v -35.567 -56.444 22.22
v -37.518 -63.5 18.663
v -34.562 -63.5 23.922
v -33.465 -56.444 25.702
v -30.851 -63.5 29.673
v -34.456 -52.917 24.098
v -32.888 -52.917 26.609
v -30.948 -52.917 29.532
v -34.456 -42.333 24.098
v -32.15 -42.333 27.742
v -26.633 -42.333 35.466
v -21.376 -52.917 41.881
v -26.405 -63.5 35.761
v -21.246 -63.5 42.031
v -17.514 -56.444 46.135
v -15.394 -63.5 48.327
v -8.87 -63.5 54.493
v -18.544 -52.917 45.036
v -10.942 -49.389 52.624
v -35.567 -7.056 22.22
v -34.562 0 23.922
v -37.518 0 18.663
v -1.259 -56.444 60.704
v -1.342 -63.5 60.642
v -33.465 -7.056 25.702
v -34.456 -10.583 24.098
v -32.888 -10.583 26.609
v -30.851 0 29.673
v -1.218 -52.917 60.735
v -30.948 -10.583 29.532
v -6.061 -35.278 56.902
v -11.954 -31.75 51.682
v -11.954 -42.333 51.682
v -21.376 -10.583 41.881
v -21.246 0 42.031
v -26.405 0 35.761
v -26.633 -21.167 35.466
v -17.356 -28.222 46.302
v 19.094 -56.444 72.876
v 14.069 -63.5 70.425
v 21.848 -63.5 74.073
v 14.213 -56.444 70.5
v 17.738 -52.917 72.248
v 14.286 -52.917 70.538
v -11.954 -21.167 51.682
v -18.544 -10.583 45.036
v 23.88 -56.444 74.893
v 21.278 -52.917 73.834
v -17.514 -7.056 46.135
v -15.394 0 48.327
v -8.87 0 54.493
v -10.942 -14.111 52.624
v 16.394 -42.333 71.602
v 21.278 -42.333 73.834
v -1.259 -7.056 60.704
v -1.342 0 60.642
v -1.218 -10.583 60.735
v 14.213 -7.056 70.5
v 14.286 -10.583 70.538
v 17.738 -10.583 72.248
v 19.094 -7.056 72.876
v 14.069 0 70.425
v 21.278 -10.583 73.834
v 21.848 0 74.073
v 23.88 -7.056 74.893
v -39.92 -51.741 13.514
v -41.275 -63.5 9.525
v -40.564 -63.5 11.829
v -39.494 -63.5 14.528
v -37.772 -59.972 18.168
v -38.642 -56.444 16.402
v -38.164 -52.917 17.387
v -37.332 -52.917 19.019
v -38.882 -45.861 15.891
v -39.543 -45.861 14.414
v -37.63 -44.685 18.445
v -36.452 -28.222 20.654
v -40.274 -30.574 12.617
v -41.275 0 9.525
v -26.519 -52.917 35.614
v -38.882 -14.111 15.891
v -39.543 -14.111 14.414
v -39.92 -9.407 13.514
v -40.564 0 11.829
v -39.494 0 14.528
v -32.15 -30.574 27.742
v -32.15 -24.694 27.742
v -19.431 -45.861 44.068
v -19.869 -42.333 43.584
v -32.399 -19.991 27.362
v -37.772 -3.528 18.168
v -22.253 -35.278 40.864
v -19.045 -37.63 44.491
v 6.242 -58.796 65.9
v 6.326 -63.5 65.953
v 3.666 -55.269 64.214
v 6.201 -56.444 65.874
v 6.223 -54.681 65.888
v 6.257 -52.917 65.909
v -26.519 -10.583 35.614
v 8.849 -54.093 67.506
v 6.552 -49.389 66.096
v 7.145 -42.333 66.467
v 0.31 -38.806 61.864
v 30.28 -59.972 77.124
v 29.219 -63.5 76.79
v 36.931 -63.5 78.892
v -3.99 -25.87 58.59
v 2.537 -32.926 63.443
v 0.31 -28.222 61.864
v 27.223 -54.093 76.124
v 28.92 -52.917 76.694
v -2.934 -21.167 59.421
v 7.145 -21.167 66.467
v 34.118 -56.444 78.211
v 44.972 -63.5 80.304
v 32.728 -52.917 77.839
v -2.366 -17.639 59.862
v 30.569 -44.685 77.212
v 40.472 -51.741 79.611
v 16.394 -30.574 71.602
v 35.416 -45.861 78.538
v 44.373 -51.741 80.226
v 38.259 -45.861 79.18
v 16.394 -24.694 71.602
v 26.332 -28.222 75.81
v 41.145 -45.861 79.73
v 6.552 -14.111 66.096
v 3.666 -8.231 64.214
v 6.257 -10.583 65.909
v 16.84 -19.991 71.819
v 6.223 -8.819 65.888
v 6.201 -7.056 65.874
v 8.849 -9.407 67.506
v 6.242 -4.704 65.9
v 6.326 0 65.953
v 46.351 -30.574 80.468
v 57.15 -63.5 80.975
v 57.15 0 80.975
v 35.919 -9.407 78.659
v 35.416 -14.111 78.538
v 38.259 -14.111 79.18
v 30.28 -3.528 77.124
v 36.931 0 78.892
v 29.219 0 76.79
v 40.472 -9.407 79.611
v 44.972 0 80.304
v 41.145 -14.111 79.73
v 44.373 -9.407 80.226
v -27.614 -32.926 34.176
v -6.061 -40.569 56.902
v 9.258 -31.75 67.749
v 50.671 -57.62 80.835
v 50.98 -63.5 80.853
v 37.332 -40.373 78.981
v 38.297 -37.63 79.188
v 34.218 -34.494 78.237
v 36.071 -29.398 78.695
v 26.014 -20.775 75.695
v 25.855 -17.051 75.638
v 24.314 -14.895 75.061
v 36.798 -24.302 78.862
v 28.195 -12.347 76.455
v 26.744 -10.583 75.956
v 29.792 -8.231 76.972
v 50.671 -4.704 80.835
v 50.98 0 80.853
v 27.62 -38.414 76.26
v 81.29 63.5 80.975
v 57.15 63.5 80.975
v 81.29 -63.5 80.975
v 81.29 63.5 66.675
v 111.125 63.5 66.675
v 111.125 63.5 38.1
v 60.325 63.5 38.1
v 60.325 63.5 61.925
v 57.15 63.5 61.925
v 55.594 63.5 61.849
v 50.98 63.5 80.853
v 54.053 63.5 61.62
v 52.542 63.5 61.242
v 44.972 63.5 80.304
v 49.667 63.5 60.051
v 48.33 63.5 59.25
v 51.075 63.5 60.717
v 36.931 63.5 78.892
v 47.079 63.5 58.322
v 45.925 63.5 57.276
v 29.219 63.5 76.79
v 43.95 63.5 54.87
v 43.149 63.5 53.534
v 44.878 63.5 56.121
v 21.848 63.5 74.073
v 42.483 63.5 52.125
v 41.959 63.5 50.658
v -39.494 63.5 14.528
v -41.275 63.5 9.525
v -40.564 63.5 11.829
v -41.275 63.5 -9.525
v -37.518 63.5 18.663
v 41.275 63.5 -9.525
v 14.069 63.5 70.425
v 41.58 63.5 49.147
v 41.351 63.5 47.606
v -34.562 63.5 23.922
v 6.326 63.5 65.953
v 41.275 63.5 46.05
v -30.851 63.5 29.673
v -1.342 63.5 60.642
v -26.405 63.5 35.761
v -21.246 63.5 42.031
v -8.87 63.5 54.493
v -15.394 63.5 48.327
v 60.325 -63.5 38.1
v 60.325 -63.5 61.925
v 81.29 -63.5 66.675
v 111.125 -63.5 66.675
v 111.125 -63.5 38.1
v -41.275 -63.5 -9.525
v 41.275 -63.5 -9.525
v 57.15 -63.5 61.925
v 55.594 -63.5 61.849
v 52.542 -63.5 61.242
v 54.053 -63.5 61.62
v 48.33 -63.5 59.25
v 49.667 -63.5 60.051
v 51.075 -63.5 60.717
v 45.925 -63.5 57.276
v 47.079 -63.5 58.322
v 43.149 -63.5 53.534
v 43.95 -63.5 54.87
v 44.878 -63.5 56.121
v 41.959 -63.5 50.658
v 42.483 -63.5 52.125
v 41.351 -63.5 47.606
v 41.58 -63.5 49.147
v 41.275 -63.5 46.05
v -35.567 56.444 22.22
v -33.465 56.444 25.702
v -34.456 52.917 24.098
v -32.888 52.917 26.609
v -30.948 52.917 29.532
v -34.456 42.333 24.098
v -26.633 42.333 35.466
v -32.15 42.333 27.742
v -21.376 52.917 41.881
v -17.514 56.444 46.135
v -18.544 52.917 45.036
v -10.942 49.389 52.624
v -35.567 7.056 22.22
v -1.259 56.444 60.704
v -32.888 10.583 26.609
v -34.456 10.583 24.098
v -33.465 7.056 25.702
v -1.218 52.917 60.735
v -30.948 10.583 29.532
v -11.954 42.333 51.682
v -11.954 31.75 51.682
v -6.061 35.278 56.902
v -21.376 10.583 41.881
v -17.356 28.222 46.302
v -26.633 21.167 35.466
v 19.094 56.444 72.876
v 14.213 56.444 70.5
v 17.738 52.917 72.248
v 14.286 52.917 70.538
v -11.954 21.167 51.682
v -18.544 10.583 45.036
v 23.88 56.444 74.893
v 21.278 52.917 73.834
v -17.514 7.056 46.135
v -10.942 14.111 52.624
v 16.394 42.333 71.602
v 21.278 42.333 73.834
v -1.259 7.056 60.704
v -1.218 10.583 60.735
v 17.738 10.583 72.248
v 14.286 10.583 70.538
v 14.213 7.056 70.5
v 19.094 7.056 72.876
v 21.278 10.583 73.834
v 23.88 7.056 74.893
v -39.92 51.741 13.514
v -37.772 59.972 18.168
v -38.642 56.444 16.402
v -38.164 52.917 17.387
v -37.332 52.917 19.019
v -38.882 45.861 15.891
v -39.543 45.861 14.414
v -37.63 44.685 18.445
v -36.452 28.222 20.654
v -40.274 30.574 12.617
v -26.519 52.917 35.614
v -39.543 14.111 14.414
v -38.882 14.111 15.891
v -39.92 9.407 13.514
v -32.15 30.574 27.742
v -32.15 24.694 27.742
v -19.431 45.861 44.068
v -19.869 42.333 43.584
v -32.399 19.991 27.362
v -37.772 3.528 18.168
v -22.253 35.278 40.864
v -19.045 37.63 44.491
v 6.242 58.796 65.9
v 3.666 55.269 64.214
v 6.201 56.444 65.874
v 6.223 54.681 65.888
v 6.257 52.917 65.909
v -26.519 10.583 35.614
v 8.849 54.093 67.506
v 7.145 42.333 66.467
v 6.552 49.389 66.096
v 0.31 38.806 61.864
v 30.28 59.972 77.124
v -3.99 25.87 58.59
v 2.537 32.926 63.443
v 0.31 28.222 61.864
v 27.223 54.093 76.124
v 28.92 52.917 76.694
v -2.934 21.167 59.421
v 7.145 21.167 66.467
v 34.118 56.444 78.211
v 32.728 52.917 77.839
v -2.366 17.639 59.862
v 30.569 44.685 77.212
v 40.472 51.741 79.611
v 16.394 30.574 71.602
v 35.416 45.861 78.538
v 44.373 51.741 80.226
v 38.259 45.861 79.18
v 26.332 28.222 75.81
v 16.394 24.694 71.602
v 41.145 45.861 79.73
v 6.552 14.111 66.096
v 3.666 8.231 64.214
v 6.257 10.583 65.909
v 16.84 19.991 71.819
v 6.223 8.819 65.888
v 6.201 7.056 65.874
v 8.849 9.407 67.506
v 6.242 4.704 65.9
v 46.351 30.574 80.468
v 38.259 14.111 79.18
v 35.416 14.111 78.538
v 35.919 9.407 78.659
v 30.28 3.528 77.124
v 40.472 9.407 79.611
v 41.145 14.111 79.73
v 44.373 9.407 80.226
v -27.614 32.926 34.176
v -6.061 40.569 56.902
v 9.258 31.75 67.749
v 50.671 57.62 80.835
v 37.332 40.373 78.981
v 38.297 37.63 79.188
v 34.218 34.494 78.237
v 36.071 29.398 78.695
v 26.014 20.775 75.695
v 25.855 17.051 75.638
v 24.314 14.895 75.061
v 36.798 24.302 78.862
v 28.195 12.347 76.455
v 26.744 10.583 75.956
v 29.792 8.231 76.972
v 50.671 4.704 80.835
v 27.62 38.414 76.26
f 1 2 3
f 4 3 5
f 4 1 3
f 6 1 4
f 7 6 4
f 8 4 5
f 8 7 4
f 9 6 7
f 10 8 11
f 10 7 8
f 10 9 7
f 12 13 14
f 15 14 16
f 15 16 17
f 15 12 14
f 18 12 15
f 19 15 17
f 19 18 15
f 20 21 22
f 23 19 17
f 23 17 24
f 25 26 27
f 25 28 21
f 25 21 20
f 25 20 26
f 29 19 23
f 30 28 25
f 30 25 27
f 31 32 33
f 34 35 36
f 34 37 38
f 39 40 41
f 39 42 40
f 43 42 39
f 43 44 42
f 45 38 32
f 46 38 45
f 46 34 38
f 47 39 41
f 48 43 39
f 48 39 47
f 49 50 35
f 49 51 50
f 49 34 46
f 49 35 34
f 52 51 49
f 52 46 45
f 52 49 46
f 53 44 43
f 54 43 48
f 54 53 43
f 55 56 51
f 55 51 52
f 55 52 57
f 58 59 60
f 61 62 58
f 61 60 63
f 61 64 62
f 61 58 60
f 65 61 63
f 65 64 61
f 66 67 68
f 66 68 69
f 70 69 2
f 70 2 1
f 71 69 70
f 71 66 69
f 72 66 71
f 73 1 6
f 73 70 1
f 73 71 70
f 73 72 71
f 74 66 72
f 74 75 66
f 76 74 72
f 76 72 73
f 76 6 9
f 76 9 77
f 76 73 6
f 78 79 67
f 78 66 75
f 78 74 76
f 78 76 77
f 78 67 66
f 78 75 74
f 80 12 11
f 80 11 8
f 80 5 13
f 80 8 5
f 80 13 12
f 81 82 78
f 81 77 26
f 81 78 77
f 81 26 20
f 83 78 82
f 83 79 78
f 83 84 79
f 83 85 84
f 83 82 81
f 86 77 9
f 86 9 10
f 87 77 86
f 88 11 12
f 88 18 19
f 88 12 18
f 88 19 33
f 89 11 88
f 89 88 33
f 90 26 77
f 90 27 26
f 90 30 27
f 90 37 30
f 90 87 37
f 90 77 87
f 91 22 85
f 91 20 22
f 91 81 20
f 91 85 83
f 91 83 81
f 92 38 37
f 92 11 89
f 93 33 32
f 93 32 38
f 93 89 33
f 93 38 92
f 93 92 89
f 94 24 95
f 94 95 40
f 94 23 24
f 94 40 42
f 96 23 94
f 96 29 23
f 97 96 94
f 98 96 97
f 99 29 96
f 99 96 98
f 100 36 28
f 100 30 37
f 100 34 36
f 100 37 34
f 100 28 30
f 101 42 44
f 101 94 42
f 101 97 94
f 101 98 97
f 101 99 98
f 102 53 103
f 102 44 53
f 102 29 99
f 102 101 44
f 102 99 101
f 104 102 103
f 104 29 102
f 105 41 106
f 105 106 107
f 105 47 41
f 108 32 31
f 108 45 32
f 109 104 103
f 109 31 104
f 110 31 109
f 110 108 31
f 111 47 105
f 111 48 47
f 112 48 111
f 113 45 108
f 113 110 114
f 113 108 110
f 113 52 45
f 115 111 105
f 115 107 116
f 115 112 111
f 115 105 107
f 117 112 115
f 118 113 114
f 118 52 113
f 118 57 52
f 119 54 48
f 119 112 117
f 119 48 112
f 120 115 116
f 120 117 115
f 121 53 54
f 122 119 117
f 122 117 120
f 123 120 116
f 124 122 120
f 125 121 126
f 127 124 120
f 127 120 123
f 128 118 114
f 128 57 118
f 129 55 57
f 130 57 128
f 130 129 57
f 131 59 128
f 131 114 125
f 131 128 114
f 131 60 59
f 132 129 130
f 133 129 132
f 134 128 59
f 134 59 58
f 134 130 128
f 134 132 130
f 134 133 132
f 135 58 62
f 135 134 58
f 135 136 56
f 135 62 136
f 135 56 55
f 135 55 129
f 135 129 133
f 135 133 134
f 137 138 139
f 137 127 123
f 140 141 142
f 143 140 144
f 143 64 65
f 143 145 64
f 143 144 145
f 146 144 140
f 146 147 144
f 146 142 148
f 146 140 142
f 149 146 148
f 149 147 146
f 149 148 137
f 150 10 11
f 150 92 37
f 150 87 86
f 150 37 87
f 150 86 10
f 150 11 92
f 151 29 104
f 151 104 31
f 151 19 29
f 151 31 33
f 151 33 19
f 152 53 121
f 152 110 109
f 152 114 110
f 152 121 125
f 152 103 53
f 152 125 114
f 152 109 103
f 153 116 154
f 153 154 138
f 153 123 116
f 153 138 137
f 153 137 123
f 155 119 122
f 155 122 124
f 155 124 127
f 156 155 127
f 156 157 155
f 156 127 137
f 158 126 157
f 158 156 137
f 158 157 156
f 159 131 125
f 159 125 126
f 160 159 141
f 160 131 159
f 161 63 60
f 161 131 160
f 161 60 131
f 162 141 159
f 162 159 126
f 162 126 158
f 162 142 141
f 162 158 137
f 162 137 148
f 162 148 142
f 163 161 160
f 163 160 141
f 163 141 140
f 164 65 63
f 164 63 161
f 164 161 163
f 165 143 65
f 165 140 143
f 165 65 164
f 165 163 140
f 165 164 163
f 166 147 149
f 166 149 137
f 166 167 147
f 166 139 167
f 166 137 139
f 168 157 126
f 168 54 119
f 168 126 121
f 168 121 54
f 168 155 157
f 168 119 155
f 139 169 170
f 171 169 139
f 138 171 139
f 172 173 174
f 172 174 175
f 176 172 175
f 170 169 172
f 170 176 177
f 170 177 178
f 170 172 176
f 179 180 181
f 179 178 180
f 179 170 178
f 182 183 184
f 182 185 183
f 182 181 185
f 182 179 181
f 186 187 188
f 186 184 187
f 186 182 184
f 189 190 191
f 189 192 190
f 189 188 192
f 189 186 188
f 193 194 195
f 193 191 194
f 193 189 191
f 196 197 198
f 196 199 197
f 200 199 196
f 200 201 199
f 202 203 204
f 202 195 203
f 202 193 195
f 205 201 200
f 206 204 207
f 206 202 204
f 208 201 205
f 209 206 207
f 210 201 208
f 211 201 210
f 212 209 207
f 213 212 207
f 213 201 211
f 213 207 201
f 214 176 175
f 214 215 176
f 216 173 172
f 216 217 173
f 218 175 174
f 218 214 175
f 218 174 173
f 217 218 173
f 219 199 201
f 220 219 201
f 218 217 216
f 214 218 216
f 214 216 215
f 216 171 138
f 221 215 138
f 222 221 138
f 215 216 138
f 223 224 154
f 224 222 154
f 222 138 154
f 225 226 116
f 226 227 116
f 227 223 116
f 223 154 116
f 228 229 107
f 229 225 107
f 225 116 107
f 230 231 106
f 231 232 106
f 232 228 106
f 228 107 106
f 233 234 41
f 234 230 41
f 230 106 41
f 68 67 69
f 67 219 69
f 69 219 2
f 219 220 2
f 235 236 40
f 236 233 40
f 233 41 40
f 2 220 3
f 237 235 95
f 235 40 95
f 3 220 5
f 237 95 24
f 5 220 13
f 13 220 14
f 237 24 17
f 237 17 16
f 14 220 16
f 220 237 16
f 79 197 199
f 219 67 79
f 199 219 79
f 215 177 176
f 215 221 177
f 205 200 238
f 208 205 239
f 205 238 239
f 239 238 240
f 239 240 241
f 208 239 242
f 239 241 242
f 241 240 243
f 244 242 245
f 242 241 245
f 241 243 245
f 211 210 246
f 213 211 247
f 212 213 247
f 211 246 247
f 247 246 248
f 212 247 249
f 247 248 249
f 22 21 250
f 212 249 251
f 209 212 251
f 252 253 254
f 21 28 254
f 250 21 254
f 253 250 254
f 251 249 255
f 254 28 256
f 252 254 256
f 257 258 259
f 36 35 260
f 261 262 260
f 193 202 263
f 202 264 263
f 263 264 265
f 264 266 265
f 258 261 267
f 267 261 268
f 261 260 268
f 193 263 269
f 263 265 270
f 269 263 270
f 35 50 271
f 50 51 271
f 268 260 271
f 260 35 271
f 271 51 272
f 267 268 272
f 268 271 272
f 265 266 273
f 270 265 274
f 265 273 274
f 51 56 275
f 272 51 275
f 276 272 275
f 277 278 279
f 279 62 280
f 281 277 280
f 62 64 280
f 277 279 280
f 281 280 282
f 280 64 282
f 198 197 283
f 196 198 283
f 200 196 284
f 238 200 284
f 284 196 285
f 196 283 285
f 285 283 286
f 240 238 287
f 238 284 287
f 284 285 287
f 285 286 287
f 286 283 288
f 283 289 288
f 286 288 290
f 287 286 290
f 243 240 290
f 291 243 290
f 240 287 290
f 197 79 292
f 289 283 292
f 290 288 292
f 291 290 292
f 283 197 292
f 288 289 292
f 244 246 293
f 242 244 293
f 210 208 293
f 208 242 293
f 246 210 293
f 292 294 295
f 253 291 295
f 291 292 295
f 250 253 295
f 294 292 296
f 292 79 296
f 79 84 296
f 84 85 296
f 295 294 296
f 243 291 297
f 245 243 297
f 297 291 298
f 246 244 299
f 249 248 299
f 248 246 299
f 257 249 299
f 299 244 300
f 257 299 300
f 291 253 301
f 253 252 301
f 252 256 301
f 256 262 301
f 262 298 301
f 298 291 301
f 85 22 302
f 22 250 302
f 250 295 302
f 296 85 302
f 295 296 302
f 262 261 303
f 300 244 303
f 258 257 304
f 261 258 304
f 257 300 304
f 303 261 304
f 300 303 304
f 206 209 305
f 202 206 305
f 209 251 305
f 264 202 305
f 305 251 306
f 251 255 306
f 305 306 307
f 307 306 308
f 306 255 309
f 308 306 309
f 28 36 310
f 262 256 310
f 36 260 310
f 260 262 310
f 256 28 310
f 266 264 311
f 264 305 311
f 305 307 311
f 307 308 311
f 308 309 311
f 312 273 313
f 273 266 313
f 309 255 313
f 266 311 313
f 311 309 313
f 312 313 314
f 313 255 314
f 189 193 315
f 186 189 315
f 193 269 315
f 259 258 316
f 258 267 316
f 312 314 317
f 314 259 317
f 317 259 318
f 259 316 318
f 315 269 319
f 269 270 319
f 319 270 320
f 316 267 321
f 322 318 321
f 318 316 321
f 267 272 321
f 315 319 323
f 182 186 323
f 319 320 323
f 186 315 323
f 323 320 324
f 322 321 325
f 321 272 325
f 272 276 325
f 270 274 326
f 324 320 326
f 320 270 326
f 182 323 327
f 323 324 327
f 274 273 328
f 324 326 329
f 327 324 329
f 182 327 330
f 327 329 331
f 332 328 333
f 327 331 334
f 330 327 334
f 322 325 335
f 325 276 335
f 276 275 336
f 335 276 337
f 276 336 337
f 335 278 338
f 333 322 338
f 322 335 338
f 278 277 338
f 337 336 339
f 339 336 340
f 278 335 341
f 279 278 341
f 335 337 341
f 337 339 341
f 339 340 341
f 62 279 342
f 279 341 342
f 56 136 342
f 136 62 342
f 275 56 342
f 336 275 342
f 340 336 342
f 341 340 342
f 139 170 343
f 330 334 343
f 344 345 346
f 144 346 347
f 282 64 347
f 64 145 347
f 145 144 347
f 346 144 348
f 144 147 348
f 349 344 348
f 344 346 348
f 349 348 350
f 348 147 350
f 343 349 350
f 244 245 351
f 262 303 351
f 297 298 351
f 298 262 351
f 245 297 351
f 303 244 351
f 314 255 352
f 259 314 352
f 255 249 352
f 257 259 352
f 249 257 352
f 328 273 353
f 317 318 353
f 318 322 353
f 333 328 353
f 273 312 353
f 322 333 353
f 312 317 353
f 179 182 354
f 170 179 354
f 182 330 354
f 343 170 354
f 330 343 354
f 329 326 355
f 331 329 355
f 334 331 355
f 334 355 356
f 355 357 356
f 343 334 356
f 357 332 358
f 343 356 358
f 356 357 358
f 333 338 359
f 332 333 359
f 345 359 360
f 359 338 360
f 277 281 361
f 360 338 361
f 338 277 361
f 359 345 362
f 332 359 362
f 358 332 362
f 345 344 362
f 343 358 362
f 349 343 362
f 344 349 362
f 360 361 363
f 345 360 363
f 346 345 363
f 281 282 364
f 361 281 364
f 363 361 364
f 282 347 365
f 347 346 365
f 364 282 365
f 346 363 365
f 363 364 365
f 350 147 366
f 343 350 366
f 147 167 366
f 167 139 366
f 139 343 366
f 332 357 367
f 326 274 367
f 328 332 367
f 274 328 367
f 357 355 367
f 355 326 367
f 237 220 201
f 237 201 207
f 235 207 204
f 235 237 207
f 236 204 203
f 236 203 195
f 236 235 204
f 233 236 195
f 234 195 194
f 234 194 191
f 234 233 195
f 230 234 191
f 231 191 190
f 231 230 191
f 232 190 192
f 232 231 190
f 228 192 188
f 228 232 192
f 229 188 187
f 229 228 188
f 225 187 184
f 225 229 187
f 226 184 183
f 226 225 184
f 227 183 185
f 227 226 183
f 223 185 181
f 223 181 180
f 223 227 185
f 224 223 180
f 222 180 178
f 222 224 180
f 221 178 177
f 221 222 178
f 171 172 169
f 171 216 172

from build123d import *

# Parameters (mm, degrees)
F0_W     = 20.9652720133
F0_H     = 4.7498
F1_DEPTH = 63.5


with BuildPart() as f1:
    # F0 (on Front) → F1 (new body, symmetric)
    with BuildSketch(Plane.XZ):
        with BuildLine():
            add(Edge.make_bspline(
                [(-41.275, 9.525), (-37.169303745, 25.7526282221), (0, 81.8980410695), (57.15, 80.9752)],
                knots=[0, 0, 0, 0, 121.6248811101, 121.6248811101, 121.6248811101, 121.6248811101], degree=3))
            Line((-41.275, 9.525), (22.225, 9.525))
            Line((22.225, 9.525), (22.225, 46.0502))
            ThreePointArc((22.225, 46.0502), (32.4542956671, 70.7459043329), (57.15, 80.9752))
        make_face()
        Polygon((22.225, 9.525), (-41.275, 9.525), (-41.275, -9.525), (41.275, -9.525), (41.275, 9.525), align=None)
        with BuildLine():
            Line((22.225, 46.0502), (22.225, 9.525))
            Line((22.225, 9.525), (41.275, 9.525))
            Line((41.275, 9.525), (41.275, 46.0502))
            ThreePointArc((41.275, 46.0502), (45.9246798487, 57.2755201513), (57.15, 61.9252))
            Line((57.15, 61.9252), (60.325, 61.9252))
            Line((60.325, 61.9252), (60.325, 66.675))
            Line((60.325, 66.675), (81.2902720133, 66.675))
            Line((81.2902720133, 66.675), (81.2902720133, 80.9752))
            Line((81.2902720133, 80.9752), (57.15, 80.9752))
            ThreePointArc((57.15, 80.9752), (32.4542956671, 70.7459043329), (22.225, 46.0502))
        make_face()
        with Locations((70.8076360066, 64.3001)):
            Rectangle(F0_W, F0_H)
        Polygon((111.125, 66.675), (81.2902720133, 66.675), (81.2902720133, 61.9252), (60.325, 61.9252), (60.325, 38.1), (111.125, 38.1), align=None)
    extrude(amount=F1_DEPTH, both=True)


solid = f1.part
